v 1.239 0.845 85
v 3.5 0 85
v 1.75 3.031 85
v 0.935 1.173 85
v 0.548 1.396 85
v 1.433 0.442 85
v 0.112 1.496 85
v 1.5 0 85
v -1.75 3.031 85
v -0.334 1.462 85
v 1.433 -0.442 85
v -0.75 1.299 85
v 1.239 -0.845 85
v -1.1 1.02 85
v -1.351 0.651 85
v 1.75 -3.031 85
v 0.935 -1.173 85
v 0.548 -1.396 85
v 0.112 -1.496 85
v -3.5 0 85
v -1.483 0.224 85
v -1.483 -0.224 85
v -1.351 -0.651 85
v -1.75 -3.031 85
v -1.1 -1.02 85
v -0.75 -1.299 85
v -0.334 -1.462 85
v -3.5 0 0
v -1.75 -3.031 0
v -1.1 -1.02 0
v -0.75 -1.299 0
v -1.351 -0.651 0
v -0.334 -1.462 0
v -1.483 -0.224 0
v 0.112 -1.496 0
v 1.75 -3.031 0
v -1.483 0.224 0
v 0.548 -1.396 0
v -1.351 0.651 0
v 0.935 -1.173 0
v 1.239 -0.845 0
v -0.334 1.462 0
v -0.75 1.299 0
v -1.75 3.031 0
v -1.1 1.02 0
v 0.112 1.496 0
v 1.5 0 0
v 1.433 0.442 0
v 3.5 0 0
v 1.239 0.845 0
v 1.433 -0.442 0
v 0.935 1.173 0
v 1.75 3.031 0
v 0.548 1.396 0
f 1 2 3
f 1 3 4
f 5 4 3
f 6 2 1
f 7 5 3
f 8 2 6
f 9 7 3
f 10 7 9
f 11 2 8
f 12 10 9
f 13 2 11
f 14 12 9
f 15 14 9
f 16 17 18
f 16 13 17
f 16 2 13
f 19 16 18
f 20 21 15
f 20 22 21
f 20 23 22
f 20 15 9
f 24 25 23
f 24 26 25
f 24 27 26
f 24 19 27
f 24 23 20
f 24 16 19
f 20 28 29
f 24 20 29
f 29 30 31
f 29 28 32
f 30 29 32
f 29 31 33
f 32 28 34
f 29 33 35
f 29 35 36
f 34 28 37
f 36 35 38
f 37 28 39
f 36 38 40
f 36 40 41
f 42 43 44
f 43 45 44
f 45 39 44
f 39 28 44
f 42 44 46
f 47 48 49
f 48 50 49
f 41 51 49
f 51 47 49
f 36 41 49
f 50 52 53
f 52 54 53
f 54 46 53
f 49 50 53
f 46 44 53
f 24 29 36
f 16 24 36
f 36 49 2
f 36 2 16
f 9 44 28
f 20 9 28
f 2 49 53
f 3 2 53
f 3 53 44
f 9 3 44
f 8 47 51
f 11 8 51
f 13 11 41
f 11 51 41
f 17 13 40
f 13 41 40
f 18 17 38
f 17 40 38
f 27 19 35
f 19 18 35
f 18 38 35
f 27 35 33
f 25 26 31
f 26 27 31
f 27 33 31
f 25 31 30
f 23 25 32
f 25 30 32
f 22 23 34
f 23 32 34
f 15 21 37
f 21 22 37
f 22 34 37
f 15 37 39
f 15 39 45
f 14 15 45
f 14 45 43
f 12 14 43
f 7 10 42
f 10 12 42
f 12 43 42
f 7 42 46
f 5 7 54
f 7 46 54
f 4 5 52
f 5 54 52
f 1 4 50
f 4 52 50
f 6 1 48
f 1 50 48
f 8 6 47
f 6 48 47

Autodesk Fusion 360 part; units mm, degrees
sketch "スケッチ1" plane through (0, 0, 0) normal (0, 0, 1) x (1, 0, 0)
  line L0 (3, 1.7321) -> (0, 3.4641)
  line L1 (0, 3.4641) -> (-3, 1.7321)
  line L2 (-3, 1.7321) -> (-3, -1.7321)
  line L3 (-3, -1.7321) -> (0, -3.4641)
  line L4 (0, -3.4641) -> (3, -1.7321)
  line L5 (3, -1.7321) -> (3, 1.7321)
  circle A0 centre (0, 0) radius 1.5
extrude "押し出し1" add sketch "スケッチ1" along normal blind 35
sketch "スケッチ2" plane through (0, 0, 35) normal (0, 0, 1) x (-1, 0, 0)
  circle A0 centre (0, 0) radius 1.5
  line L0 (-3, 1.7321) -> (-3, -1.7321)
  line L1 (-3, -1.7321) -> (0, -3.4641)
  line L2 (0, -3.4641) -> (3, -1.7321)
  line L3 (3, -1.7321) -> (3, 1.7321)
  line L4 (3, 1.7321) -> (0, 3.4641)
  line L5 (0, 3.4641) -> (-3, 1.7321)
  line L6 (-3.5, 0) -> (-1.75, -3.0311)
  line L7 (-1.75, -3.0311) -> (1.75, -3.0311)
  line L8 (1.75, -3.0311) -> (3.5, 0)
  line L9 (3.5, 0) -> (1.75, 3.0311)
  line L10 (1.75, 3.0311) -> (-1.75, 3.0311)
  line L11 (-1.75, 3.0311) -> (-3.5, 0)
extrude "押し出し2" add sketch "スケッチ2" along normal blind 4 contours L0 L1 L2 L3 L4 L5 L6 L7 L8 L9 L10 L11 | L0 L6 L11 | L5 L10 L11 | L1 L6 L7 | L4 L9 L10 | L2 L7 L8 | L3 L8 L9
extrude "押し出し3" cut 6 faces at (0, -3.1754, 35) (2.75, -1.5877, 35) (-2.75, -1.5877, 35) (-2.75, 1.5877, 35) (0, 3.1754, 35) (2.75, 1.5877, 35) along direction (0, 0, -1) blind 40
extrude "押し出し4" add 6 faces at (1.5833, 2.7424, 35) (3.1667, 0, 35) (-1.5833, 2.7424, 35) (1.5833, -2.7424, 35) (-1.5833, -2.7424, 35) (-3.1667, 0, 35) along direction (0, 0, -1) blind 35
extrude "押し出し5" cut 1 faces at (2.2005, 1.2273, 39) along direction (0, 0, -1) blind 4
extrude "押し出し6" add 1 faces at (0.0374, 2.5193, 35) along direction (0, 0, 1) blind 10
extrude "押し出し7" add 1 faces at (0.0374, 2.5193, 45) along direction (0, 0, 1) blind 40
